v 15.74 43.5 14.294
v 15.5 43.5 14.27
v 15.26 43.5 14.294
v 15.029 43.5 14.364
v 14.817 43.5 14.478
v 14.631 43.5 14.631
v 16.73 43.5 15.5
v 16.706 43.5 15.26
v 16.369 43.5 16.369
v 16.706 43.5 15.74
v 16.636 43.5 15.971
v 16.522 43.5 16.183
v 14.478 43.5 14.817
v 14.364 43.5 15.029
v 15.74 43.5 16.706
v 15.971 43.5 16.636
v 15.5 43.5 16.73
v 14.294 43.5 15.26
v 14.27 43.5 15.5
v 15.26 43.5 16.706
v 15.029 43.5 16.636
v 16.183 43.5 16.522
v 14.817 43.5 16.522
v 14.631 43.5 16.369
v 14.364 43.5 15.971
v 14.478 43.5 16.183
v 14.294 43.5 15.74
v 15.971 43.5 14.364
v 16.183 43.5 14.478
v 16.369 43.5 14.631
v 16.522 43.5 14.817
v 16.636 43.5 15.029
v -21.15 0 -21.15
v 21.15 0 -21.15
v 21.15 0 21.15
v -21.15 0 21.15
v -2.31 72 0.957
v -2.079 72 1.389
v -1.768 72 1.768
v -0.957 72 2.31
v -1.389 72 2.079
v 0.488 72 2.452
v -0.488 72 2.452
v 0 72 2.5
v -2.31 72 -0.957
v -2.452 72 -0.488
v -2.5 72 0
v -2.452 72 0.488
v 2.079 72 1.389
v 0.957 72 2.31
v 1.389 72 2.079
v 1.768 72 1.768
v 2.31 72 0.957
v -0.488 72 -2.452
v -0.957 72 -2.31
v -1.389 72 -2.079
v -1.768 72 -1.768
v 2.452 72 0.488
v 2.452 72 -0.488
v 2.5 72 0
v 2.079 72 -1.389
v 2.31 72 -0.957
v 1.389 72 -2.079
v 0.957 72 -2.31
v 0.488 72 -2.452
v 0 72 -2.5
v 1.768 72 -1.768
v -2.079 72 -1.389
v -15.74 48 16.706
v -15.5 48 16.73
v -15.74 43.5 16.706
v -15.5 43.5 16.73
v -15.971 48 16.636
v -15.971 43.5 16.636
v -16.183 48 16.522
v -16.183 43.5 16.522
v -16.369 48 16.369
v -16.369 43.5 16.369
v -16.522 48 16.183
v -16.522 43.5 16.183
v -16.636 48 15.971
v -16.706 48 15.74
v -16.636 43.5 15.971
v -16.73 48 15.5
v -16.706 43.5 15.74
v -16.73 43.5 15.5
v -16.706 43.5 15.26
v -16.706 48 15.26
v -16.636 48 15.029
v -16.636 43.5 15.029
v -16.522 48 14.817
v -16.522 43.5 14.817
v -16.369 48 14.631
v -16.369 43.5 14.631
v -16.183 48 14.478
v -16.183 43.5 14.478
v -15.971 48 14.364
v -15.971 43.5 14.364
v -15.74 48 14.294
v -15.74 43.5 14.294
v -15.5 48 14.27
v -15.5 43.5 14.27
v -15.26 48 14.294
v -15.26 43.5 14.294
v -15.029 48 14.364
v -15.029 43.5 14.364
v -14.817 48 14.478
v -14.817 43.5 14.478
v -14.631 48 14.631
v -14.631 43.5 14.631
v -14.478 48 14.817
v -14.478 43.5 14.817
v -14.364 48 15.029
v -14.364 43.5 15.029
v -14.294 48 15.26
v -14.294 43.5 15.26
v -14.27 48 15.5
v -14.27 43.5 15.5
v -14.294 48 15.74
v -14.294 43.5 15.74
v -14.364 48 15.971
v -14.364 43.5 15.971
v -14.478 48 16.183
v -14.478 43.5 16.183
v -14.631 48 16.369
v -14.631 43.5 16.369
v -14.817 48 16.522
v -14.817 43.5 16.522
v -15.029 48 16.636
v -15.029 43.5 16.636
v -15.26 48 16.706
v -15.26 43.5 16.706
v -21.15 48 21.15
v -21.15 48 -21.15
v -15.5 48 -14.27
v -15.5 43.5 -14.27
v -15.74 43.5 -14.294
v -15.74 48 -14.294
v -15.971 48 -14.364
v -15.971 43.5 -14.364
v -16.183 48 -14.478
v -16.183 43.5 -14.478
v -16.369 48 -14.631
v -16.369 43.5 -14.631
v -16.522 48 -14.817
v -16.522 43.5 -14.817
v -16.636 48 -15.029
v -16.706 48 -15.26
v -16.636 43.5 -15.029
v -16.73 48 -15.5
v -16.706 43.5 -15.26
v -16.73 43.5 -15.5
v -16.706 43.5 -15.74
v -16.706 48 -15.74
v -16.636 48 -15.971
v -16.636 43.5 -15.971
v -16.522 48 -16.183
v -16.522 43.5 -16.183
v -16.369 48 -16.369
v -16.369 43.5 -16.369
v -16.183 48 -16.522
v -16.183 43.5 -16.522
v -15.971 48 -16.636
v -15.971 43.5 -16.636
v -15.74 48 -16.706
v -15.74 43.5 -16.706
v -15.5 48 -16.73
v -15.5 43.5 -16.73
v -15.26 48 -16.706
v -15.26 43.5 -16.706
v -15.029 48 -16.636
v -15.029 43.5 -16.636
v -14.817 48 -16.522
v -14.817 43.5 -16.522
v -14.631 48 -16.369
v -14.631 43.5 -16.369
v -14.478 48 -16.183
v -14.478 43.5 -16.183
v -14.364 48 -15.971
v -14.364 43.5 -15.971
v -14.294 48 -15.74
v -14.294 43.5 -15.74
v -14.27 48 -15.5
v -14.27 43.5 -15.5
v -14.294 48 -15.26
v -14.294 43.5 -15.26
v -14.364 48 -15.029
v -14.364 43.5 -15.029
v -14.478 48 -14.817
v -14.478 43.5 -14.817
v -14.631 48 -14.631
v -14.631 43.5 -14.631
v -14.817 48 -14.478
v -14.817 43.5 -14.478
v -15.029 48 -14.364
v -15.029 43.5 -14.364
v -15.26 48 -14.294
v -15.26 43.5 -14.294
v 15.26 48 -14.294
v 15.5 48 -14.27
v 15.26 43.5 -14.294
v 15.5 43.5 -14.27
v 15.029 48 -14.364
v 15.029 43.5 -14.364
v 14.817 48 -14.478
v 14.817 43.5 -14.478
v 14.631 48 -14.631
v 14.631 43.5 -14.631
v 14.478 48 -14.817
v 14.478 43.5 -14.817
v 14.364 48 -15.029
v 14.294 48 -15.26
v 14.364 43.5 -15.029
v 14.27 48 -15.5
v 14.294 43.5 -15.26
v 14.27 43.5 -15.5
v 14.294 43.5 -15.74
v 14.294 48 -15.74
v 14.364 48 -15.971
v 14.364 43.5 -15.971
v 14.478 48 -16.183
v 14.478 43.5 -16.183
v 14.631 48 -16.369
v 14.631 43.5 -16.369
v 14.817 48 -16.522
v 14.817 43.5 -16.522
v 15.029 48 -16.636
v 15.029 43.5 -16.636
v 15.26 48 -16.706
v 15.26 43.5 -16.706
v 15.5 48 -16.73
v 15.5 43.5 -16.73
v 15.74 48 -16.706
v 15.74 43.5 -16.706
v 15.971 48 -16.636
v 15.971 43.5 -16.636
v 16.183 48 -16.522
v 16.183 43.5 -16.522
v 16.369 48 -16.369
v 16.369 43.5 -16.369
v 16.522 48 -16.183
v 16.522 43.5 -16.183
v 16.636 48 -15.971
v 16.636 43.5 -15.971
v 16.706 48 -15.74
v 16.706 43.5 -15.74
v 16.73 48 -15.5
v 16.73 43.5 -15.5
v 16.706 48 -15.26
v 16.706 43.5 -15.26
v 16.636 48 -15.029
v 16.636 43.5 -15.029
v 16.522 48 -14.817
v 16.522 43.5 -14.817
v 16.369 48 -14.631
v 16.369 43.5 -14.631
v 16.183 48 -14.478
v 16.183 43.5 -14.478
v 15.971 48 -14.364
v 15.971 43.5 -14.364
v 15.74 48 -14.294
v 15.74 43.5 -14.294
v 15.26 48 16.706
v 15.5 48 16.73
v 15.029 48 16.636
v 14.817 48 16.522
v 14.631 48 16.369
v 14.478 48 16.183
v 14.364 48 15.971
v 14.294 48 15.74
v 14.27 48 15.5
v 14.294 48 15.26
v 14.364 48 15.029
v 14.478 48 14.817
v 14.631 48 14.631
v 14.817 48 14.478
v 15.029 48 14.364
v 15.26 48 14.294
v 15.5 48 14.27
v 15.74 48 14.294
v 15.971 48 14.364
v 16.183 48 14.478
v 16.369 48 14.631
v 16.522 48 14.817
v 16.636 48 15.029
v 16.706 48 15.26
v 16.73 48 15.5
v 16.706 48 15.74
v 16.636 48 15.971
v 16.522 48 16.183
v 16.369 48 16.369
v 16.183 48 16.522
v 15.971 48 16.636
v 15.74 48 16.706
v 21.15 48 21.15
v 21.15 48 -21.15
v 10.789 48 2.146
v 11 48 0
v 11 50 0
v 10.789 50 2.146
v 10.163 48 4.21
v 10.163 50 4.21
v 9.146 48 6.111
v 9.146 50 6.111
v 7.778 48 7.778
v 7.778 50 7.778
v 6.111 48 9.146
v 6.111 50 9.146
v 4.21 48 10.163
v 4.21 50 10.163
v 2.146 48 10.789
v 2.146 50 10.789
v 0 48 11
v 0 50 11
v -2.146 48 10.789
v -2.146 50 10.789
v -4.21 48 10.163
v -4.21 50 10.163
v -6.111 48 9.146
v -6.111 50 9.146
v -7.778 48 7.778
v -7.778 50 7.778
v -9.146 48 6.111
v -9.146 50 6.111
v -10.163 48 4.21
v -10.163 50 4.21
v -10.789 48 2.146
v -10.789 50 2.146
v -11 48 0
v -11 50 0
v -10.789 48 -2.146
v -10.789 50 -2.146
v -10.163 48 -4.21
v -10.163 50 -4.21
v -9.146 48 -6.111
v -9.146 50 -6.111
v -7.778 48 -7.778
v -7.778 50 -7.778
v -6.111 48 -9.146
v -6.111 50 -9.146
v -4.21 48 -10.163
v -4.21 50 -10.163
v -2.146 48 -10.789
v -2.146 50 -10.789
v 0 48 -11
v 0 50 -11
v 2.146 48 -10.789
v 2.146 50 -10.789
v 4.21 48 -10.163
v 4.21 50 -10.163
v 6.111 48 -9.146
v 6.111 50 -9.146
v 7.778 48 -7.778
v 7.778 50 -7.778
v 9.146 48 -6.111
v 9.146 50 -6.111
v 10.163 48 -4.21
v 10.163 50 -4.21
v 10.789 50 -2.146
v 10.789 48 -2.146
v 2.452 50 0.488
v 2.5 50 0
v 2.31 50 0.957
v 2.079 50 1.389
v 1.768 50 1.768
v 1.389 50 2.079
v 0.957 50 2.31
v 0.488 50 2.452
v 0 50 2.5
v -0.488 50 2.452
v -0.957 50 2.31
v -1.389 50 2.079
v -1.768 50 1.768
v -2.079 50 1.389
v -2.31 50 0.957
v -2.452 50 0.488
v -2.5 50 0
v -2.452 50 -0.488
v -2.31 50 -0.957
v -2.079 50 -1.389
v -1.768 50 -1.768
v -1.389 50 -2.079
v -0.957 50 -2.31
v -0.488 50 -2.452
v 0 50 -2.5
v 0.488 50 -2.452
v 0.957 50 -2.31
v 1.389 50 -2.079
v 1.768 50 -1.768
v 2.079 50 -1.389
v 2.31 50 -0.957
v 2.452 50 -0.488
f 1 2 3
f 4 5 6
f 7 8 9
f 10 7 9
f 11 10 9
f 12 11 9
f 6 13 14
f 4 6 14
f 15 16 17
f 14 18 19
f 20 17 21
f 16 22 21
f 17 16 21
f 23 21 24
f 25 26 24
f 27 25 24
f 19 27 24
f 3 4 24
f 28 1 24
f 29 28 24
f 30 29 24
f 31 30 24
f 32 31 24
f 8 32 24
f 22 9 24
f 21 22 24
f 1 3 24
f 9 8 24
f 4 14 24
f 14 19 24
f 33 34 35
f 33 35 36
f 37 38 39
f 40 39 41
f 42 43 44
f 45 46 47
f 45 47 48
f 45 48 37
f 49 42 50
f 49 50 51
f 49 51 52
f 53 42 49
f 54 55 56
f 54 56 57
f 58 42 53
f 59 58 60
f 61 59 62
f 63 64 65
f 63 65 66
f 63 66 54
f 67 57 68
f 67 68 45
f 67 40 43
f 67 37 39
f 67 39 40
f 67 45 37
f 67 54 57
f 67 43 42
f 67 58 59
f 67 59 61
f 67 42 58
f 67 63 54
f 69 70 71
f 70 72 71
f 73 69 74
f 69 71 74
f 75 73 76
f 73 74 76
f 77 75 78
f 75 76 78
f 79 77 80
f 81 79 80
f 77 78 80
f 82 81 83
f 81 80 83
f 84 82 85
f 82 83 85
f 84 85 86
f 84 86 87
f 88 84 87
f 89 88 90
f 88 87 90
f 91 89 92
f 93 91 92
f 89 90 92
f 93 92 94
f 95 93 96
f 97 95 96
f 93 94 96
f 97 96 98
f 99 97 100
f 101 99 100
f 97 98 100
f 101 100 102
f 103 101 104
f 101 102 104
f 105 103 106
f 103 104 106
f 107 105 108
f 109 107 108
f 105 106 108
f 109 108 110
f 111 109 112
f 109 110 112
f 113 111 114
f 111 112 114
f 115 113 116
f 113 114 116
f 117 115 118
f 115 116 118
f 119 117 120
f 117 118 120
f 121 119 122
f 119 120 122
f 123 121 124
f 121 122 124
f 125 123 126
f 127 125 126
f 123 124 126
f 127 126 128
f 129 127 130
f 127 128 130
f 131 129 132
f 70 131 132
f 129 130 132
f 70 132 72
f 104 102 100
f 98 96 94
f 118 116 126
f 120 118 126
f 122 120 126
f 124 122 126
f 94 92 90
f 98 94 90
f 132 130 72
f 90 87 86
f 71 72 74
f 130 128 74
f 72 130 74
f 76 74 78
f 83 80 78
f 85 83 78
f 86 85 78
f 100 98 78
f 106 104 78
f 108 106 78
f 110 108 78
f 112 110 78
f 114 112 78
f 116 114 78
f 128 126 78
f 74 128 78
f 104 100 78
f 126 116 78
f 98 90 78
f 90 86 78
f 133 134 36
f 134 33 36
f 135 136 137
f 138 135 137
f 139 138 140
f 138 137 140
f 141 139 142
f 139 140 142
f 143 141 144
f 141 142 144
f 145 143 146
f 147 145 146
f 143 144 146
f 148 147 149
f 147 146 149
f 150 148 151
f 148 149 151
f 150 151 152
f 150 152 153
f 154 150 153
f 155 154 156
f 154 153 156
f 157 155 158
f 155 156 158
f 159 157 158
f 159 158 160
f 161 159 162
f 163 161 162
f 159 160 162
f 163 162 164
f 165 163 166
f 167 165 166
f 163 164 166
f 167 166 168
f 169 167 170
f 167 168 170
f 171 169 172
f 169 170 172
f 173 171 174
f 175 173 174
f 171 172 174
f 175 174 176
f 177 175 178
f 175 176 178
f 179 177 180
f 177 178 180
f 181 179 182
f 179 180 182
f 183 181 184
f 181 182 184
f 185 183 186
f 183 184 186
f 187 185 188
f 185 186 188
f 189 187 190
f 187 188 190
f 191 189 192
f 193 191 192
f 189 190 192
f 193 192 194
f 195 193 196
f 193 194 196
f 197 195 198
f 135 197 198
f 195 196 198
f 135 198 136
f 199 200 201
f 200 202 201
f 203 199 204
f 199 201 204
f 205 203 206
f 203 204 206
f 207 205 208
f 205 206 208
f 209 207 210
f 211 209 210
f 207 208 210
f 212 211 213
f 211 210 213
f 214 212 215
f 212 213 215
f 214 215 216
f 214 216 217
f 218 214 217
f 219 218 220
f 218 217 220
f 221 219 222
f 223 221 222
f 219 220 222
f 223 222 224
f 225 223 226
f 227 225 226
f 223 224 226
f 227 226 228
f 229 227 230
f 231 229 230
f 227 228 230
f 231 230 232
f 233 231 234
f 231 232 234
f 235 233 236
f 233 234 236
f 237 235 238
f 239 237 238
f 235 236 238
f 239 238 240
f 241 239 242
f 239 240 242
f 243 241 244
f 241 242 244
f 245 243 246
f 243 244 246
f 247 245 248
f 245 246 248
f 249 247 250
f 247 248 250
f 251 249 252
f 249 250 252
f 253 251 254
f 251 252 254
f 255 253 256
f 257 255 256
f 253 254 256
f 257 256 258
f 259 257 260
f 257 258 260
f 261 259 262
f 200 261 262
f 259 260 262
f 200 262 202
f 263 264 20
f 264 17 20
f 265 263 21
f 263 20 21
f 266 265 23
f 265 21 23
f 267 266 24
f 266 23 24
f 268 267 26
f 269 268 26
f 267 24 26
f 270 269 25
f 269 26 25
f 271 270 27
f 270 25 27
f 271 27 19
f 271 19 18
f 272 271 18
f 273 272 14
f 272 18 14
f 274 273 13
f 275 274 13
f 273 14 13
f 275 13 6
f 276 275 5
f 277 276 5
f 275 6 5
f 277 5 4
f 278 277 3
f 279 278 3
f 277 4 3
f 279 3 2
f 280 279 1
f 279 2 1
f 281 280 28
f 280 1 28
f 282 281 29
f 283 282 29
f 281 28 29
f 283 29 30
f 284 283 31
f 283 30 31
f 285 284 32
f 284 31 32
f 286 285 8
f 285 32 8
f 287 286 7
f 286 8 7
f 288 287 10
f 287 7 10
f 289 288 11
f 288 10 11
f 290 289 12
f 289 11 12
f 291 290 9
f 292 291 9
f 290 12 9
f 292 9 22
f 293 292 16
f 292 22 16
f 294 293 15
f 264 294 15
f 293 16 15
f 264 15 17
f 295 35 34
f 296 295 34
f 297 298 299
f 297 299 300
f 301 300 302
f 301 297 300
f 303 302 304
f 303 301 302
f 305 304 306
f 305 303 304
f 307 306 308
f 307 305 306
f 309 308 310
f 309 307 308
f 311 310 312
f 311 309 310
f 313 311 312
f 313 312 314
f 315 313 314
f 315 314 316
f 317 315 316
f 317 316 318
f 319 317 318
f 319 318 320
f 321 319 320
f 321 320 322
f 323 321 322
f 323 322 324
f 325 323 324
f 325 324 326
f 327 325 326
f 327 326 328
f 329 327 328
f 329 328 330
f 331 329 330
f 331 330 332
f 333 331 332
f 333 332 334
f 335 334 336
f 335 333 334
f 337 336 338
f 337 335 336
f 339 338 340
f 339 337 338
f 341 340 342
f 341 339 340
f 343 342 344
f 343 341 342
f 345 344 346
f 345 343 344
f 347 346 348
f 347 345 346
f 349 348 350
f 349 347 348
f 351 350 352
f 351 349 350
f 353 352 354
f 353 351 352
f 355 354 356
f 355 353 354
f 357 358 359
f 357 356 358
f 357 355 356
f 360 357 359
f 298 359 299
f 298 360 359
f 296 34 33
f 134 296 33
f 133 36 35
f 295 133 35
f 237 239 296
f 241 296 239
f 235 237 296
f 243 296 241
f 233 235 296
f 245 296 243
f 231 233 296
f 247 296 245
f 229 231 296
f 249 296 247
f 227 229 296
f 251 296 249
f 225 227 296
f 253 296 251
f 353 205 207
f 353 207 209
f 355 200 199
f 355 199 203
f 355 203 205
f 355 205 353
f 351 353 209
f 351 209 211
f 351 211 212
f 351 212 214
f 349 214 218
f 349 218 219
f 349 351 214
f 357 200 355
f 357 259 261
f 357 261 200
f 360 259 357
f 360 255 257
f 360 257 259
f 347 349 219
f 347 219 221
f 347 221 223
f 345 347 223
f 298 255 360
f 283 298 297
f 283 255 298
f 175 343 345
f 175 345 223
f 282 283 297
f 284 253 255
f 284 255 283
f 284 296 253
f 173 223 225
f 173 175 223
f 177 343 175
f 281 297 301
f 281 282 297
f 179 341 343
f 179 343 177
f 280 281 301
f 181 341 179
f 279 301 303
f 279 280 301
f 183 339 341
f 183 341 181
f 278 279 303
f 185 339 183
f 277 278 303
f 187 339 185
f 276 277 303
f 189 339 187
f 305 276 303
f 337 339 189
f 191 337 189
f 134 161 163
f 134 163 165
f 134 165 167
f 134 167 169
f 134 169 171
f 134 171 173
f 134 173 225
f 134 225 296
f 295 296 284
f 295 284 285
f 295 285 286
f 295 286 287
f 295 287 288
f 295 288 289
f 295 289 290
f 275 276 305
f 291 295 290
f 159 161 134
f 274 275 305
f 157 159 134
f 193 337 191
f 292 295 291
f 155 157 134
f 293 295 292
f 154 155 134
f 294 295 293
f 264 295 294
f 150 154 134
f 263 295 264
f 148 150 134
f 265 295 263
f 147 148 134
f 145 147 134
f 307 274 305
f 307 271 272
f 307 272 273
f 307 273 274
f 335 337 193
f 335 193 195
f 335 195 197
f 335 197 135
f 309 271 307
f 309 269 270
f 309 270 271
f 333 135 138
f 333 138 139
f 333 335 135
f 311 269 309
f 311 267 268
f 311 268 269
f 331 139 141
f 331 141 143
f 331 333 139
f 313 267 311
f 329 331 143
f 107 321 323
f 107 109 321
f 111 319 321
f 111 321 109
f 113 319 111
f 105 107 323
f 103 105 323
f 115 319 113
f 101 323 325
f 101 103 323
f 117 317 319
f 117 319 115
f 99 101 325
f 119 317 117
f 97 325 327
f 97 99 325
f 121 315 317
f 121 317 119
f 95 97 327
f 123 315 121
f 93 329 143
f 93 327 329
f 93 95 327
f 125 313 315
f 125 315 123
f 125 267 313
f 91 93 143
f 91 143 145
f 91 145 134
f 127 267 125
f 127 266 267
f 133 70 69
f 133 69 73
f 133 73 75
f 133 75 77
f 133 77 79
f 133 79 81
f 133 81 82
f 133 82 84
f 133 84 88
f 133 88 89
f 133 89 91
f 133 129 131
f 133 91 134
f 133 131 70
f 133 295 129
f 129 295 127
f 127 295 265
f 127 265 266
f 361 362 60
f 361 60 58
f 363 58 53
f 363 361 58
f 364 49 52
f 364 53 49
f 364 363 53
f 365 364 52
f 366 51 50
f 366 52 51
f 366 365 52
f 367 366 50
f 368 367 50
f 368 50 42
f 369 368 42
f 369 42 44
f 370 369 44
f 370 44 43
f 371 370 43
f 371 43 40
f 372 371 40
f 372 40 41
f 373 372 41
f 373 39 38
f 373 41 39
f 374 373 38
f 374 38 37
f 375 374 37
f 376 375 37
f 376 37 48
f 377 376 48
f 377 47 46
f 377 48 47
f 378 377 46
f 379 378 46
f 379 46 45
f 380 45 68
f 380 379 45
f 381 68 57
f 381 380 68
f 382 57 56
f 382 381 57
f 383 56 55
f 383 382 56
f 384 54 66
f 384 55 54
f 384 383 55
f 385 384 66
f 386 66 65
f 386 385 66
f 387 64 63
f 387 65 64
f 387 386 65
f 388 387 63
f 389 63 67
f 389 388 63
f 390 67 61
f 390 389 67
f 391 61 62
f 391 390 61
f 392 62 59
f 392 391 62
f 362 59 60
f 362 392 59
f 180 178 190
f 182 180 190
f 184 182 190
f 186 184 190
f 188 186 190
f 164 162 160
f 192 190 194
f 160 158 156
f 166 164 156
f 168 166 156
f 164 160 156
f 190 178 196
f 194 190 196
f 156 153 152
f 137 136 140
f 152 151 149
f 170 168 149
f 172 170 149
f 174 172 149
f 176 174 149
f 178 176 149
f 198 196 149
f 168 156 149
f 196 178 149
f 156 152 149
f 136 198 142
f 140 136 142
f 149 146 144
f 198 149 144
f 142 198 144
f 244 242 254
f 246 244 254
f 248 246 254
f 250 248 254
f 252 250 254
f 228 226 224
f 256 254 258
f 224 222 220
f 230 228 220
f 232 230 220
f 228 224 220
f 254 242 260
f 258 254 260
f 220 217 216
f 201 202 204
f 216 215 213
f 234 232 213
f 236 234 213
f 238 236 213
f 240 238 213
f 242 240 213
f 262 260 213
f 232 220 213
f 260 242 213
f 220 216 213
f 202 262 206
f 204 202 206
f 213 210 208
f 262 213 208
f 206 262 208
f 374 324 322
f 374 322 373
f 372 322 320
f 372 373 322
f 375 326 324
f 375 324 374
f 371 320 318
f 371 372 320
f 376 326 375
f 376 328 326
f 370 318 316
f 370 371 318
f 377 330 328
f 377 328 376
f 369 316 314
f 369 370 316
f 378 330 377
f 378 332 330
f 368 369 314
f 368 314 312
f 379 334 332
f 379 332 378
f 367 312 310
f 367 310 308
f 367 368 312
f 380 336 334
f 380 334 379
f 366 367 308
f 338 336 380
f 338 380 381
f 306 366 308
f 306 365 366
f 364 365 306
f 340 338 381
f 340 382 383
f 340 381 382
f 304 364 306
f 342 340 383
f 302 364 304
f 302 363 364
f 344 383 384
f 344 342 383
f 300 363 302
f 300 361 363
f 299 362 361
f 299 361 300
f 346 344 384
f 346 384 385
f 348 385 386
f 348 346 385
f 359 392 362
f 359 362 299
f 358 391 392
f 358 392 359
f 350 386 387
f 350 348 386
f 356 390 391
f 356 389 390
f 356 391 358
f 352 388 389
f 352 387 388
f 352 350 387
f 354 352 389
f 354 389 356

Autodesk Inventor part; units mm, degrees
ref_plane "YZ Plane" through (0, 0, 0) normal (1, 0, 0) x (0, 1, 0)
ref_plane "XZ Plane" through (0, 0, 0) normal (0, 1, 0) x (-1, 0, 0)
ref_plane "XY Plane" through (0, 0, 0) normal (0, 0, 1) x (1, 0, 0)
sketch "Sketch1" plane through (0, 0, 0) normal (0, 1, 0) x (-1, 0, 0)
  line L0 (-21.15, -21.15) -> (21.15, -21.15)
  line L1 (21.15, -21.15) -> (21.15, 21.15)
  line L2 (21.15, 21.15) -> (-21.15, 21.15)
  line L3 (-21.15, 21.15) -> (-21.15, -21.15)
  line L4 (-21.15, -21.15) -> (21.15, 21.15) construction
  line L5 (21.15, -21.15) -> (-21.15, 21.15) construction
  point P0 (0, 0)
  dimension "d0" = 42.3
  dimension "d1" = 42.3
extrude "Extrusion1" add sketch "Sketch1" along normal blind 48
sketch "Sketch2" plane through (0, 48, 0) normal (0, 1, 0) x (1, 0, 0)
  circle A0 centre (0, 0) radius 11
  dimension "d4" = 22
extrude "Extrusion2" add sketch "Sketch2" along normal blind 2
sketch "Sketch3" plane through (0, 50, 0) normal (0, 1, 0) x (1, 0, 0)
  circle A0 centre (0, 0) radius 11 projected
  circle A1 centre (0, 0) radius 2.5
  dimension "d7" = 5
extrude "Extrusion3" add sketch "Sketch3" along normal blind 22 contours A1
sketch "Sketch4" plane through (0, 48, 0) normal (0, 1, 0) x (1, 0, 0)
  circle A0 centre (0, 0) radius 11 projected
  line L0 (-15.5, 15.5) -> (15.5, 15.5) construction
  line L1 (15.5, 15.5) -> (15.5, -15.5) construction
  line L2 (15.5, -15.5) -> (-15.5, -15.5) construction
  line L3 (-15.5, -15.5) -> (-15.5, 15.5) construction
  dimension "d10" = 31
  dimension "d11" = 31
  dimension "d12" = 15.5
  dimension "d13" = 15.5
hole "Hole1" at (-15.5, 48, -15.5) at (15.5, 48, -15.5) at (15.5, 48, 15.5) at (-15.5, 48, 15.5) direction (0, -1, 0) diameter 2.459 depth 4.5 thread size "M3x0.5" class "6H" standard "ISO Metric profile"
sketch "Sketch5" plane through (21.15, 0, 21.15) normal (1, 0, 0) x (0, 0, -1)
  line L0 (0, 0) -> (42.3, 0) projected
  line L1 (42.3, 0) -> (42.3, 48) projected
  line L2 (0, 48) -> (42.3, 48) projected
  line L3 (0, 0) -> (0, 48) projected
  line L4 (26.15, 0) -> (26.15, 10)
  line L5 (26.15, 10) -> (16.15, 10)
  line L6 (16.15, 10) -> (16.15, 0)
  line L7 (16.15, 10) -> (26.15, 0)
  line L8 (26.15, 10) -> (16.15, 0)
  line L9 (18.65, 2.5) -> (23.65, 2.5)
  line L10 (23.65, 2.5) -> (23.65, 7.5)
  line L11 (23.65, 7.5) -> (18.65, 7.5)
  line L12 (18.65, 7.5) -> (18.65, 2.5)
  line L13 (18.65, 2.5) -> (23.65, 7.5) construction
  line L14 (23.65, 2.5) -> (18.65, 7.5) construction
  point P0 (21.15, 0)
  point P1 (21.15, 5)
  dimension "d23" = 16.15
  dimension "d24" = 16.15
  dimension "d26" = 10
  dimension "d27" = 10
  dimension "d28" = 5
  dimension "d29" = 5
properties part number "NEMA_17" material "Steel, Carbon"
